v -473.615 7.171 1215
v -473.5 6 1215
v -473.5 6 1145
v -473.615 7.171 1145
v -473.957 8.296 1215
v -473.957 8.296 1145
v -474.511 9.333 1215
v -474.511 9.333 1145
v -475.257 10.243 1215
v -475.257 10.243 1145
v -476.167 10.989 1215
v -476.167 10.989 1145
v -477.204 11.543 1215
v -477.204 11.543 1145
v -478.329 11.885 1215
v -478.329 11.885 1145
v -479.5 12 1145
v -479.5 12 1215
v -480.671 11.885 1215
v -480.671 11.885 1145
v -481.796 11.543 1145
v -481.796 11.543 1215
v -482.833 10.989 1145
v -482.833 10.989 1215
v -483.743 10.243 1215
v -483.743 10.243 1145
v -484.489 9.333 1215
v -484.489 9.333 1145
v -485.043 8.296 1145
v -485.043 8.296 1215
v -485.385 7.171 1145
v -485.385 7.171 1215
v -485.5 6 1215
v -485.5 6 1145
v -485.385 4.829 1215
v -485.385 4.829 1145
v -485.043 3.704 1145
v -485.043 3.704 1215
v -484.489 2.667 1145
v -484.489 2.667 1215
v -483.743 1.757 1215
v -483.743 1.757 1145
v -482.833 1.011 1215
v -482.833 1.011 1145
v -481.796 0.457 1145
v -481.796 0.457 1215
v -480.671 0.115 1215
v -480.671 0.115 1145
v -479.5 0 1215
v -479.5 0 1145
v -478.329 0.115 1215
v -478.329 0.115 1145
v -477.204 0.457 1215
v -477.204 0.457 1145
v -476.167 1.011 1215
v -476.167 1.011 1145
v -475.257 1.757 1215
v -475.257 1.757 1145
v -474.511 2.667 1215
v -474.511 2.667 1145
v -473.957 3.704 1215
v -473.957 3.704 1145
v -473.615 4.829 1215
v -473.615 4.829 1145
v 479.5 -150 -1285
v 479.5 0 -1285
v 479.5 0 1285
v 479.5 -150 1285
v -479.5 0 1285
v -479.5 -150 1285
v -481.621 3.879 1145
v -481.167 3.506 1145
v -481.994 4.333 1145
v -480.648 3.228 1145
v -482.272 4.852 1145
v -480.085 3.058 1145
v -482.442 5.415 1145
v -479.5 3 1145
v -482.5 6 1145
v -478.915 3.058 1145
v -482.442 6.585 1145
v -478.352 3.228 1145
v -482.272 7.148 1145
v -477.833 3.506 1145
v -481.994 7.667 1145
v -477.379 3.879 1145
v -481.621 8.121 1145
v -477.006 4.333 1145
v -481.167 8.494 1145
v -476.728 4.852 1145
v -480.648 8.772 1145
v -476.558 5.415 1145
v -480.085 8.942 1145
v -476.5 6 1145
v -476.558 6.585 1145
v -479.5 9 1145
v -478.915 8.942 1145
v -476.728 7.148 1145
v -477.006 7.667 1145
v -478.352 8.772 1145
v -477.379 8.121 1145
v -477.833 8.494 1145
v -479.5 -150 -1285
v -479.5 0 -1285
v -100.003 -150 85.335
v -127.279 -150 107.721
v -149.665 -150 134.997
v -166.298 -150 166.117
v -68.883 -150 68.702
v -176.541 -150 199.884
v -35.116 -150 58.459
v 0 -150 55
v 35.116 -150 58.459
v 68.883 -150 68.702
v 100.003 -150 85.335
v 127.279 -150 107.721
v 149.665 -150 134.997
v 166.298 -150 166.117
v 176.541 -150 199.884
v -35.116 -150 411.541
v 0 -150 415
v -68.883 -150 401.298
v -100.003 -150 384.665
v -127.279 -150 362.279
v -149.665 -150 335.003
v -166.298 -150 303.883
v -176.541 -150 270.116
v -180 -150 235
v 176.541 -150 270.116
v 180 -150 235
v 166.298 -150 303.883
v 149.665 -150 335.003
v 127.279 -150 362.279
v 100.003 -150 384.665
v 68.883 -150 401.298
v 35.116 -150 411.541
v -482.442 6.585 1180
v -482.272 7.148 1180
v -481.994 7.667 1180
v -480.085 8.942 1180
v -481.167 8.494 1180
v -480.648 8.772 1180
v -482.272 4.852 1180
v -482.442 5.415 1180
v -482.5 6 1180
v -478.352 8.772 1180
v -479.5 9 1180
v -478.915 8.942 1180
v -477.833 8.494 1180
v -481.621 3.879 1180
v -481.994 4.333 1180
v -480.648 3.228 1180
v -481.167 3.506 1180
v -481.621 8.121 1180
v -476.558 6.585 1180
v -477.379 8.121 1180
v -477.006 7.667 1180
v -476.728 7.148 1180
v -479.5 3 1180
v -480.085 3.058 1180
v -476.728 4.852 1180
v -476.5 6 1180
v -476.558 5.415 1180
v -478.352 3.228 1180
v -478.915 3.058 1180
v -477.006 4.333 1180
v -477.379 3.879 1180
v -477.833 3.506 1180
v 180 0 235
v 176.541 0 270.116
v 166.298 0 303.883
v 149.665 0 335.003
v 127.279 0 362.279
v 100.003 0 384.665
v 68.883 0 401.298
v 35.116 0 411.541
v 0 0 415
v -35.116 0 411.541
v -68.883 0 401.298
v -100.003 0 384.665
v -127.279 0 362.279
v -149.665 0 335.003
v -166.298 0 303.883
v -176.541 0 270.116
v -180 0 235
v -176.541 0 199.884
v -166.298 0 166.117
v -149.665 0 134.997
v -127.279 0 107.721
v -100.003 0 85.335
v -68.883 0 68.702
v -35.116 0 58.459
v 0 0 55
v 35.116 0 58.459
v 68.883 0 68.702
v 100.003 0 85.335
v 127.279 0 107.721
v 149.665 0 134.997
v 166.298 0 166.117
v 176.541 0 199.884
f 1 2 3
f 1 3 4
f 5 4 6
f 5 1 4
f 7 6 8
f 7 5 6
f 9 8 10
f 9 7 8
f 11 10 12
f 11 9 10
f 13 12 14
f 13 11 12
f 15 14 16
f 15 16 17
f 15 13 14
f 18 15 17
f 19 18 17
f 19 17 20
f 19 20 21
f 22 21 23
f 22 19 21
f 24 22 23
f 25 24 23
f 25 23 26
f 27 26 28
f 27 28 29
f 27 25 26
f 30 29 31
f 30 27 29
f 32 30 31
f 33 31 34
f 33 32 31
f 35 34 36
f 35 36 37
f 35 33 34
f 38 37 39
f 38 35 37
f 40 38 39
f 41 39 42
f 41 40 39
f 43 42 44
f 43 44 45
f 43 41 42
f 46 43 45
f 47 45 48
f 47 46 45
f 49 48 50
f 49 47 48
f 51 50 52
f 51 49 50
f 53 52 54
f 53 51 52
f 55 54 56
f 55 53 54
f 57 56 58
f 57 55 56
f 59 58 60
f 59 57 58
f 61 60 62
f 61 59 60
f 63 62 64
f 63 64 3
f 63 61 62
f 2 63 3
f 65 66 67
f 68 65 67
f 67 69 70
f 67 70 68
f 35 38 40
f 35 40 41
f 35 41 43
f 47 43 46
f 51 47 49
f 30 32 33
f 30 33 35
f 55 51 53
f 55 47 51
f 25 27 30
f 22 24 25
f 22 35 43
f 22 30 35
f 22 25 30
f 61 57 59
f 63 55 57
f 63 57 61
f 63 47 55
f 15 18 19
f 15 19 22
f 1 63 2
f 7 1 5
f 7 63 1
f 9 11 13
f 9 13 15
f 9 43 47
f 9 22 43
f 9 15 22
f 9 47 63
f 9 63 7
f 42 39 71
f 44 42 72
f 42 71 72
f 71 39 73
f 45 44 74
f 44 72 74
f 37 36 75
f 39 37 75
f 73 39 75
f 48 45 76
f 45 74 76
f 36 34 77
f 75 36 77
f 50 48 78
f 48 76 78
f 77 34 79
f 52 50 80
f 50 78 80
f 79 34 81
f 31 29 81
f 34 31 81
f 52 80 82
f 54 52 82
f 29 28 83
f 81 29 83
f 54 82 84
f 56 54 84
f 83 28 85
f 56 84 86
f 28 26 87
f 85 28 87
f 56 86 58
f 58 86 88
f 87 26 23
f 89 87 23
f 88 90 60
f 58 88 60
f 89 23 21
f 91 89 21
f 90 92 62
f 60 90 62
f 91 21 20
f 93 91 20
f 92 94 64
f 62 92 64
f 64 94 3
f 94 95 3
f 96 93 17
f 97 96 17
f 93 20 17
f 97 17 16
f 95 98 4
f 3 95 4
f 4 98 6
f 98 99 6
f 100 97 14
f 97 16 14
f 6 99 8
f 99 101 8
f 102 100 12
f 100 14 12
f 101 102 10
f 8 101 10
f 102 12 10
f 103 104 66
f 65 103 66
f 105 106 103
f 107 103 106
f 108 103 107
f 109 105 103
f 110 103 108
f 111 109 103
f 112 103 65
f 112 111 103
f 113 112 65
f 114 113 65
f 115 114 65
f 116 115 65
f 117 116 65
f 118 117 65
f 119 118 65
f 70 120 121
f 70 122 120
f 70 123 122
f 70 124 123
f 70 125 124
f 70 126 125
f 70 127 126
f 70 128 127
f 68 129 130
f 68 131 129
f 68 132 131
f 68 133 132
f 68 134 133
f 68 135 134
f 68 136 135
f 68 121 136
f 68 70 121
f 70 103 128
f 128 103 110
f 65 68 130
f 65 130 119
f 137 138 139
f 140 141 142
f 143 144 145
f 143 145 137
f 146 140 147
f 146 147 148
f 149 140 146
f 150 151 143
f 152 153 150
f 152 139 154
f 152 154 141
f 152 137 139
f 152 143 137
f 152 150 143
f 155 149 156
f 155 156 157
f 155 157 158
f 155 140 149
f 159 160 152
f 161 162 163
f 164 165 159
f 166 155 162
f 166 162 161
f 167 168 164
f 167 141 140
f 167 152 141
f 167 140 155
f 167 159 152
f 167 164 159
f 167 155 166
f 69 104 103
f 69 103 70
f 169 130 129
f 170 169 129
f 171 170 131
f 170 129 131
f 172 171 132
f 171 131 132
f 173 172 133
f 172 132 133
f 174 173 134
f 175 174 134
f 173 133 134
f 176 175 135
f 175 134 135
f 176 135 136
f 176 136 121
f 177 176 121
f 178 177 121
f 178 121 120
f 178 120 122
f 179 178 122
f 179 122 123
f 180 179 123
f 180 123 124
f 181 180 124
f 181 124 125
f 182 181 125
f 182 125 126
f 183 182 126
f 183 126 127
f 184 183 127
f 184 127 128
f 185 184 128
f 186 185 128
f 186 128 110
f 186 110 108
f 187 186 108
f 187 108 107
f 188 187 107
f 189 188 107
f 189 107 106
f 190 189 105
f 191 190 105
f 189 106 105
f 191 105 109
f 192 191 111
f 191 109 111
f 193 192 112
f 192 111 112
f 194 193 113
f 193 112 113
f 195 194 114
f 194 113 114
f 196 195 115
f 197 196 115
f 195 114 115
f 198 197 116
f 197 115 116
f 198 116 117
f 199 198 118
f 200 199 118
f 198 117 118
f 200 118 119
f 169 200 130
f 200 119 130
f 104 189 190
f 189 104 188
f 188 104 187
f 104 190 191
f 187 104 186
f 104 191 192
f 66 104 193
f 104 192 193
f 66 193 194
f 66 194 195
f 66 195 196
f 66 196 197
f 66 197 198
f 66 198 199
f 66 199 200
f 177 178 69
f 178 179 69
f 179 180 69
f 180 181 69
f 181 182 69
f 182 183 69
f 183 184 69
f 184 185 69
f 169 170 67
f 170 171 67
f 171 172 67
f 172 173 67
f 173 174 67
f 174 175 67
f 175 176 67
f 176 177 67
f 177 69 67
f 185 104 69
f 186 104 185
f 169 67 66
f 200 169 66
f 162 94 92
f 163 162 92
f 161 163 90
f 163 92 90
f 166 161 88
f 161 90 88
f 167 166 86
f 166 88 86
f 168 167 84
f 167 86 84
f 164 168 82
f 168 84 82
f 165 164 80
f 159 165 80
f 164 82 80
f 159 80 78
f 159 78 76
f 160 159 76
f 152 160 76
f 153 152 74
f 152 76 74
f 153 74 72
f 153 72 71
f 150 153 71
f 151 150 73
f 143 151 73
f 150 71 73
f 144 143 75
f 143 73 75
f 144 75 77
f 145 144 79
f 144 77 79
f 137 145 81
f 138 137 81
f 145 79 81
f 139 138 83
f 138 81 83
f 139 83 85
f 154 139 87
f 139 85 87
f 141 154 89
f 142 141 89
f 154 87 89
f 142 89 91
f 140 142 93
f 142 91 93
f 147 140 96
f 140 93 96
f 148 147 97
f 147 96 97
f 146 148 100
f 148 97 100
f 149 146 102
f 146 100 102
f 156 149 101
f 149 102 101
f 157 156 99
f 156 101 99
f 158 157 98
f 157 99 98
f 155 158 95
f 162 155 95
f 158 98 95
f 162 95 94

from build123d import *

# Parameters (mm, degrees)
F0_W     = 959
F0_H     = 2570
F1_DEPTH = 150
F2_R     = 180
F3_DEPTH = 185.42
F5_R     = 6
F6_DEPTH = 70
F7_R     = 3
F8_DEPTH = 35


with BuildPart() as f1:
    # F0 (on Front) → F1 (new body)
    with BuildSketch(Plane.XZ):
        Rectangle(F0_W, F0_H)
    extrude(amount=F1_DEPTH)

    # F2 (on face) → F3 (cut)
    with BuildSketch(Plane.XZ.offset(150)):
        with Locations((0, 235)):
            Circle(F2_R)
    extrude(amount=-F3_DEPTH, mode=Mode.SUBTRACT)


with BuildPart() as f6:
    # F5 (on offset) → F6 (new body)
    with BuildSketch(Plane.XY.offset(1215)):
        with Locations((-479.5, 6)):
            Circle(F5_R)
    extrude(amount=-F6_DEPTH)

    # F7 (on face) → F8 (cut)
    with BuildSketch(Plane(origin=(0, 0, 1145), x_dir=(1, 0, 0), z_dir=(0, 0, -1))):
        with Locations((-479.5, -6)):
            Circle(F7_R)
    extrude(amount=-F8_DEPTH, mode=Mode.SUBTRACT)


solid = Compound([f1.part, f6.part])
